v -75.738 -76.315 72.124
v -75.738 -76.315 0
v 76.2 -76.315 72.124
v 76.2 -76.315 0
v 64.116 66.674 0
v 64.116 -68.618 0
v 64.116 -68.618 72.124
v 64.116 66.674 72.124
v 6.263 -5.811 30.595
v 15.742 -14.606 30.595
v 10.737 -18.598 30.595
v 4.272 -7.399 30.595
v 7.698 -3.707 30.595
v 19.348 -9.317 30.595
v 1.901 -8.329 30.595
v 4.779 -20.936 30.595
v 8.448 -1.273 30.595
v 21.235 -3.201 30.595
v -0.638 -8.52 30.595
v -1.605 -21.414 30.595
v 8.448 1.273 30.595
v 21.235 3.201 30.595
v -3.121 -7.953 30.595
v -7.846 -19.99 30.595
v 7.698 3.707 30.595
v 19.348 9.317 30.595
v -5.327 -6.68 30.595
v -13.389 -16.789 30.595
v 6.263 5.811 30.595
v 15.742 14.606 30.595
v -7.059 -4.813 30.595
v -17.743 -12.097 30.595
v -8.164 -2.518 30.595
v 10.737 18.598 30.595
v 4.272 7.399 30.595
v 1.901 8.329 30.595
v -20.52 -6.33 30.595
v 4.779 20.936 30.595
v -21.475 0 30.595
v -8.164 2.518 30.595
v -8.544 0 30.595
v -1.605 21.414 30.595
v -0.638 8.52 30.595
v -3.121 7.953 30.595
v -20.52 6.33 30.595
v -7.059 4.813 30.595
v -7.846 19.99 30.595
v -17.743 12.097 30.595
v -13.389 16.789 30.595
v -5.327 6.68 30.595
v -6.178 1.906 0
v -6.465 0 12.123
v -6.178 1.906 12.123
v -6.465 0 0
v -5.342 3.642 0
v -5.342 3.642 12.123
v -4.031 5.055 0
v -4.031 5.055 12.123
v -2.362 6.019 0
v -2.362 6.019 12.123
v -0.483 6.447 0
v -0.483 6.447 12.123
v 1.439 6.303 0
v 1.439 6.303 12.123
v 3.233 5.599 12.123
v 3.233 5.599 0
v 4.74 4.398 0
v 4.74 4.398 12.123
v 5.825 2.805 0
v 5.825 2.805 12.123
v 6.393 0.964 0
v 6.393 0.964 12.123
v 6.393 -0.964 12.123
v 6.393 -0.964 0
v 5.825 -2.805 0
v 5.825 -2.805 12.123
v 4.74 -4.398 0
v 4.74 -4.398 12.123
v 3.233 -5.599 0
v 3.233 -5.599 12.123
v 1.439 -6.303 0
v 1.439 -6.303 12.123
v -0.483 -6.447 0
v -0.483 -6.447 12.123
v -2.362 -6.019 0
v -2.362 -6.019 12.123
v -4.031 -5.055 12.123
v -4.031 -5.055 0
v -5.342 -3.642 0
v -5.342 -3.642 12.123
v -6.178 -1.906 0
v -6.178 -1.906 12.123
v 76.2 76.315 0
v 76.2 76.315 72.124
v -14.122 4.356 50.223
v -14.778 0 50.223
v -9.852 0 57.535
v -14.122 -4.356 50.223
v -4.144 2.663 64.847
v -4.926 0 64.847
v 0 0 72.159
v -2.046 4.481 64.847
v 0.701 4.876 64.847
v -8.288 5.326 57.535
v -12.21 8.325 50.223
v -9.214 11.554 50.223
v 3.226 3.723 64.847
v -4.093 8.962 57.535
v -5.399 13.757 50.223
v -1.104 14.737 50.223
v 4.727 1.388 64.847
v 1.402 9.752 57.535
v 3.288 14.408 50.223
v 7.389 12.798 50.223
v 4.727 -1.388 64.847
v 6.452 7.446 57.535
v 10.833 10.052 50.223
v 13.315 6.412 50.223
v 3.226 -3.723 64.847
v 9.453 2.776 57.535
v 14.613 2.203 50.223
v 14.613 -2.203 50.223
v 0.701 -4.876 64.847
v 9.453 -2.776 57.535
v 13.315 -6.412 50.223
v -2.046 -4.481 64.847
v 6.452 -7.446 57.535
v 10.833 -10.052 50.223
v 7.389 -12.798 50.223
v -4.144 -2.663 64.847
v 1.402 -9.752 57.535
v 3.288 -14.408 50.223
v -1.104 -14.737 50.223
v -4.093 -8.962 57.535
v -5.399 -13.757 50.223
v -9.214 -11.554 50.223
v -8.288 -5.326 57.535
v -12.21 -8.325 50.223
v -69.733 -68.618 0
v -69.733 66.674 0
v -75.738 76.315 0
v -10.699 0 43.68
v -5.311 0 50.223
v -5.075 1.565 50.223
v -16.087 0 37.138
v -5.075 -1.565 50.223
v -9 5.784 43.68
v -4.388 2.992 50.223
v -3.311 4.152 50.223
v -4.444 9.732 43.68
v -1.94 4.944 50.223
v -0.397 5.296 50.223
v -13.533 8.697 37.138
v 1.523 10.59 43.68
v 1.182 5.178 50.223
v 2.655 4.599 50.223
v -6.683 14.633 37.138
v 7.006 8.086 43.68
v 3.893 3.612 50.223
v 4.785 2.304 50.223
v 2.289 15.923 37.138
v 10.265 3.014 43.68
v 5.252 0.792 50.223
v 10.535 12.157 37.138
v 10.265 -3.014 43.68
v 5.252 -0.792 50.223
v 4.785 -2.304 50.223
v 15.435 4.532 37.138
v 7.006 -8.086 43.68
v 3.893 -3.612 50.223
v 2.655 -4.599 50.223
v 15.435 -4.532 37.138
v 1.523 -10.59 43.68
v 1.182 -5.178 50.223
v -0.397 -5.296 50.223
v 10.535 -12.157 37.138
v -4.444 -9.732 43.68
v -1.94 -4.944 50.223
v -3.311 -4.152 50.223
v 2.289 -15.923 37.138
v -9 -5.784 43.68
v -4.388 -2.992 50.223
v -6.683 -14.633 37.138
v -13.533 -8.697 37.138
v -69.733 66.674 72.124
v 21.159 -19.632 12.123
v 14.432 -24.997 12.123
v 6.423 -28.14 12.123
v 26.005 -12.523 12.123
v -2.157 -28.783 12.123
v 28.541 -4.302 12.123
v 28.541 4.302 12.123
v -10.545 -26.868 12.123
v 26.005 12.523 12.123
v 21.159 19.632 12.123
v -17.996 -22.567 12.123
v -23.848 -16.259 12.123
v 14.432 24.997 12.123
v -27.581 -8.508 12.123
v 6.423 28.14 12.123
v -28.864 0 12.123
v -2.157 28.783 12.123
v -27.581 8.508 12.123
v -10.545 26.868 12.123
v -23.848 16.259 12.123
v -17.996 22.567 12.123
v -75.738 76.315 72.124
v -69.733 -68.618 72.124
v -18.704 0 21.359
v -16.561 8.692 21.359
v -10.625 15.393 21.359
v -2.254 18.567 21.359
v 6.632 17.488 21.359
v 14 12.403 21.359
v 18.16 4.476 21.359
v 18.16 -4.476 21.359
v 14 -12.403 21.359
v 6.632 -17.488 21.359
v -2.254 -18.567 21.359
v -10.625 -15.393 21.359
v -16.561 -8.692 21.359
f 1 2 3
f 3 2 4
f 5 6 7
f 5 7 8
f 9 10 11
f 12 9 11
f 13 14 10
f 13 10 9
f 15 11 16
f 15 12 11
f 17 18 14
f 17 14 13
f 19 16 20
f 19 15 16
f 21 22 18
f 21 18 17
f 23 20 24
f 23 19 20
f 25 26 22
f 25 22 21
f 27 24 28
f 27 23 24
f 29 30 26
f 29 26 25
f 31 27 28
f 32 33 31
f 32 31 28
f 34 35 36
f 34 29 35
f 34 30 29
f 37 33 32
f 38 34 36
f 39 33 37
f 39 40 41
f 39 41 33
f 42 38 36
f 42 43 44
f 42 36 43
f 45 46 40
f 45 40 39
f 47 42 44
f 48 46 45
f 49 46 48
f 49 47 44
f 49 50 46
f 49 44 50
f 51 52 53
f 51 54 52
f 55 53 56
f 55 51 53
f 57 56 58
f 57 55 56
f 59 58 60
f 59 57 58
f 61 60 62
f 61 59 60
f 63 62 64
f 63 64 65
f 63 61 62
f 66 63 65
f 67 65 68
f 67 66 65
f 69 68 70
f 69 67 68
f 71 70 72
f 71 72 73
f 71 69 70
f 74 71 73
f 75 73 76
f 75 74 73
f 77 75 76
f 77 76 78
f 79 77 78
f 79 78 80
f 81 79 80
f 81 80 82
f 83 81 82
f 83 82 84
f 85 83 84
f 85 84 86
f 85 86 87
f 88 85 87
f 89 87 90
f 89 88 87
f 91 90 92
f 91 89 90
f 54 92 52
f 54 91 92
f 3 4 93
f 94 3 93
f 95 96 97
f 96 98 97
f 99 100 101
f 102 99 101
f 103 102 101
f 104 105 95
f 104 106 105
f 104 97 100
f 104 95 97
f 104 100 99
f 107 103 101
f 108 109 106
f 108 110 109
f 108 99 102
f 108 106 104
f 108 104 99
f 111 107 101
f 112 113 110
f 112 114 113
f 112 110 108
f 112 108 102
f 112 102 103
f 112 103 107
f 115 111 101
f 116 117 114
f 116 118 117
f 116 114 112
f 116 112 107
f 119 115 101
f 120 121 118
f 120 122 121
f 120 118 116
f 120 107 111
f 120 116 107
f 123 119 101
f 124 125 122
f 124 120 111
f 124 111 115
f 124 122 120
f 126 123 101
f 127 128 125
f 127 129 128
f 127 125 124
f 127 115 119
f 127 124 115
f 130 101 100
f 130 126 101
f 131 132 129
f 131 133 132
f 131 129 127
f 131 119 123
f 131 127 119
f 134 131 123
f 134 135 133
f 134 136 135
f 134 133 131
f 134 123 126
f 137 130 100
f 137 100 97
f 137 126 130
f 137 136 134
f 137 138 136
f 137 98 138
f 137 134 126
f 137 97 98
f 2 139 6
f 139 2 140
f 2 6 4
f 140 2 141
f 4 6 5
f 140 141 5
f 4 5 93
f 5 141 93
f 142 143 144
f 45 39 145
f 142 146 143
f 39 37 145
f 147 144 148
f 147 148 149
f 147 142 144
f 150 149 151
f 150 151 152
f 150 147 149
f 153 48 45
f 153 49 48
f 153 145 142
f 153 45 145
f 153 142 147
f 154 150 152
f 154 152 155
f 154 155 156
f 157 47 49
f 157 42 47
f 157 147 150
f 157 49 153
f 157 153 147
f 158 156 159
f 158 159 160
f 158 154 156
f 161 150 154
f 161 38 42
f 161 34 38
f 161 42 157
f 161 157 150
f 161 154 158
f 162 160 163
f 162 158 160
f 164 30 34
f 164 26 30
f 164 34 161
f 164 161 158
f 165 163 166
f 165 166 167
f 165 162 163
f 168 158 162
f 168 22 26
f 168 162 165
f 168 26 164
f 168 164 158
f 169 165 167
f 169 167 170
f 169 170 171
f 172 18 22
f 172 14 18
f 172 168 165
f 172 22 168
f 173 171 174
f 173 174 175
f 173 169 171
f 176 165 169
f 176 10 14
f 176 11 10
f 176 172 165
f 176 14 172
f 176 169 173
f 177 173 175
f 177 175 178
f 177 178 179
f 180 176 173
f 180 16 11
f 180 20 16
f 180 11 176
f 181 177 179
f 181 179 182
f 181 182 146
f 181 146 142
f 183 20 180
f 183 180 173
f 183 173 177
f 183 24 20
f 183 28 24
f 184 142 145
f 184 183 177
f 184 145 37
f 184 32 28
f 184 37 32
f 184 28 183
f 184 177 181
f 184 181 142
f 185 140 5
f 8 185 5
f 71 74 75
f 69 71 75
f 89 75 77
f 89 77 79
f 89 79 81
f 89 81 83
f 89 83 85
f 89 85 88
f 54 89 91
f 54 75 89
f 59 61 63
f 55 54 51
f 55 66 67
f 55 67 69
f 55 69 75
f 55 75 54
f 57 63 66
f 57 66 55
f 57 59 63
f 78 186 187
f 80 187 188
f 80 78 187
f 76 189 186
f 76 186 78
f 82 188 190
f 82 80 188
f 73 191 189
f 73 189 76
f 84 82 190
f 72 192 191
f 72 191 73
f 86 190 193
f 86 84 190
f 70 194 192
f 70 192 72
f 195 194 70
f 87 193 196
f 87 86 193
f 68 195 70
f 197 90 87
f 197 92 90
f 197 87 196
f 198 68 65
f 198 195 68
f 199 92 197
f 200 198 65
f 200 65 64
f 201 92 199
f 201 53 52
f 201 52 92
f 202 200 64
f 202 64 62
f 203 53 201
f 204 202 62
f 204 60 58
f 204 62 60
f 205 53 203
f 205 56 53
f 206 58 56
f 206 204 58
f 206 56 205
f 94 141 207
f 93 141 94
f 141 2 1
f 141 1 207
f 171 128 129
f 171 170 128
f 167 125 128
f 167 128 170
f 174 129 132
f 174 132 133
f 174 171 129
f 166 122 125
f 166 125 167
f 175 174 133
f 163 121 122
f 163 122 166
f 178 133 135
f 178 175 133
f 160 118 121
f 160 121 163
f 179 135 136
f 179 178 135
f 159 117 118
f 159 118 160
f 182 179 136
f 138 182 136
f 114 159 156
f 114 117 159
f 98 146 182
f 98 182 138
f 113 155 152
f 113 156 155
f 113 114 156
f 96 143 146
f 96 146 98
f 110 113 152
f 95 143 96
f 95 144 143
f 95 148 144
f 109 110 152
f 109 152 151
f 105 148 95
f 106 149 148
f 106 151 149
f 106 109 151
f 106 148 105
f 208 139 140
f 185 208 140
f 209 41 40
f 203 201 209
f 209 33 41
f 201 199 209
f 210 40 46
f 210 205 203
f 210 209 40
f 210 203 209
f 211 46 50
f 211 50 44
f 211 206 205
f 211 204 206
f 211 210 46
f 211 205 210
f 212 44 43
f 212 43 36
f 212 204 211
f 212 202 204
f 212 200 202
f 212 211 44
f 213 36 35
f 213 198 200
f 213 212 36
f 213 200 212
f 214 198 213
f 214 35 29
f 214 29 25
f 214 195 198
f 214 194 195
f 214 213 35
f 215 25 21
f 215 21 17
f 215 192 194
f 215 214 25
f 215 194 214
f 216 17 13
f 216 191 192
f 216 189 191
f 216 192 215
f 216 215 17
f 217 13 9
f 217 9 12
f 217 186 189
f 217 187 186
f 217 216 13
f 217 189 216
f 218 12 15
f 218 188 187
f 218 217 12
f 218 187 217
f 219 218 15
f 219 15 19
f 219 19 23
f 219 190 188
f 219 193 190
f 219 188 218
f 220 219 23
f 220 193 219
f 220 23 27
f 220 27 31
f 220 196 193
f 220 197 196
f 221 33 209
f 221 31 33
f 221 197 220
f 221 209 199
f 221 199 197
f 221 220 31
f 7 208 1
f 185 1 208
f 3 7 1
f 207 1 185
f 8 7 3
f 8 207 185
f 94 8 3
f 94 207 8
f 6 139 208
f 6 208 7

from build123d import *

# Parameters (mm, degrees)
F3_W     = 151.938185
F3_H     = 152.63091
F3_W_2   = 133.849606
F3_H_2   = 135.291994
F4_DEPTH = 72.12365


with BuildPart() as f1:
    # F0 (on Front) → F1 (revolve)
    with BuildSketch(Plane.XZ):
        Polygon((-28.863637, 12.122728), (-11.545454, 12.122728), (-6.465455, 12.122728), (-6.465455, 0), (0, 0), (0, 72.159089), (-14.778182, 50.222728), (-5.31091, 50.222728), (-21.474546, 30.595455), (-8.543637, 30.595455), align=None)
    revolve(axis=Axis((0, 0, 36.079545), (0, 0, -1)))


with BuildPart() as f4:
    # F3 (on face) → F4 (new body)
    with BuildSketch(Plane.XY):
        with Locations((0.230909, 0)):
            Rectangle(F3_W, F3_H)
        with Locations((-2.808504, -0.97239)):
            Rectangle(F3_W_2, F3_H_2, mode=Mode.SUBTRACT)
    extrude(amount=F4_DEPTH)


solid = Compound([f1.part, f4.part])
